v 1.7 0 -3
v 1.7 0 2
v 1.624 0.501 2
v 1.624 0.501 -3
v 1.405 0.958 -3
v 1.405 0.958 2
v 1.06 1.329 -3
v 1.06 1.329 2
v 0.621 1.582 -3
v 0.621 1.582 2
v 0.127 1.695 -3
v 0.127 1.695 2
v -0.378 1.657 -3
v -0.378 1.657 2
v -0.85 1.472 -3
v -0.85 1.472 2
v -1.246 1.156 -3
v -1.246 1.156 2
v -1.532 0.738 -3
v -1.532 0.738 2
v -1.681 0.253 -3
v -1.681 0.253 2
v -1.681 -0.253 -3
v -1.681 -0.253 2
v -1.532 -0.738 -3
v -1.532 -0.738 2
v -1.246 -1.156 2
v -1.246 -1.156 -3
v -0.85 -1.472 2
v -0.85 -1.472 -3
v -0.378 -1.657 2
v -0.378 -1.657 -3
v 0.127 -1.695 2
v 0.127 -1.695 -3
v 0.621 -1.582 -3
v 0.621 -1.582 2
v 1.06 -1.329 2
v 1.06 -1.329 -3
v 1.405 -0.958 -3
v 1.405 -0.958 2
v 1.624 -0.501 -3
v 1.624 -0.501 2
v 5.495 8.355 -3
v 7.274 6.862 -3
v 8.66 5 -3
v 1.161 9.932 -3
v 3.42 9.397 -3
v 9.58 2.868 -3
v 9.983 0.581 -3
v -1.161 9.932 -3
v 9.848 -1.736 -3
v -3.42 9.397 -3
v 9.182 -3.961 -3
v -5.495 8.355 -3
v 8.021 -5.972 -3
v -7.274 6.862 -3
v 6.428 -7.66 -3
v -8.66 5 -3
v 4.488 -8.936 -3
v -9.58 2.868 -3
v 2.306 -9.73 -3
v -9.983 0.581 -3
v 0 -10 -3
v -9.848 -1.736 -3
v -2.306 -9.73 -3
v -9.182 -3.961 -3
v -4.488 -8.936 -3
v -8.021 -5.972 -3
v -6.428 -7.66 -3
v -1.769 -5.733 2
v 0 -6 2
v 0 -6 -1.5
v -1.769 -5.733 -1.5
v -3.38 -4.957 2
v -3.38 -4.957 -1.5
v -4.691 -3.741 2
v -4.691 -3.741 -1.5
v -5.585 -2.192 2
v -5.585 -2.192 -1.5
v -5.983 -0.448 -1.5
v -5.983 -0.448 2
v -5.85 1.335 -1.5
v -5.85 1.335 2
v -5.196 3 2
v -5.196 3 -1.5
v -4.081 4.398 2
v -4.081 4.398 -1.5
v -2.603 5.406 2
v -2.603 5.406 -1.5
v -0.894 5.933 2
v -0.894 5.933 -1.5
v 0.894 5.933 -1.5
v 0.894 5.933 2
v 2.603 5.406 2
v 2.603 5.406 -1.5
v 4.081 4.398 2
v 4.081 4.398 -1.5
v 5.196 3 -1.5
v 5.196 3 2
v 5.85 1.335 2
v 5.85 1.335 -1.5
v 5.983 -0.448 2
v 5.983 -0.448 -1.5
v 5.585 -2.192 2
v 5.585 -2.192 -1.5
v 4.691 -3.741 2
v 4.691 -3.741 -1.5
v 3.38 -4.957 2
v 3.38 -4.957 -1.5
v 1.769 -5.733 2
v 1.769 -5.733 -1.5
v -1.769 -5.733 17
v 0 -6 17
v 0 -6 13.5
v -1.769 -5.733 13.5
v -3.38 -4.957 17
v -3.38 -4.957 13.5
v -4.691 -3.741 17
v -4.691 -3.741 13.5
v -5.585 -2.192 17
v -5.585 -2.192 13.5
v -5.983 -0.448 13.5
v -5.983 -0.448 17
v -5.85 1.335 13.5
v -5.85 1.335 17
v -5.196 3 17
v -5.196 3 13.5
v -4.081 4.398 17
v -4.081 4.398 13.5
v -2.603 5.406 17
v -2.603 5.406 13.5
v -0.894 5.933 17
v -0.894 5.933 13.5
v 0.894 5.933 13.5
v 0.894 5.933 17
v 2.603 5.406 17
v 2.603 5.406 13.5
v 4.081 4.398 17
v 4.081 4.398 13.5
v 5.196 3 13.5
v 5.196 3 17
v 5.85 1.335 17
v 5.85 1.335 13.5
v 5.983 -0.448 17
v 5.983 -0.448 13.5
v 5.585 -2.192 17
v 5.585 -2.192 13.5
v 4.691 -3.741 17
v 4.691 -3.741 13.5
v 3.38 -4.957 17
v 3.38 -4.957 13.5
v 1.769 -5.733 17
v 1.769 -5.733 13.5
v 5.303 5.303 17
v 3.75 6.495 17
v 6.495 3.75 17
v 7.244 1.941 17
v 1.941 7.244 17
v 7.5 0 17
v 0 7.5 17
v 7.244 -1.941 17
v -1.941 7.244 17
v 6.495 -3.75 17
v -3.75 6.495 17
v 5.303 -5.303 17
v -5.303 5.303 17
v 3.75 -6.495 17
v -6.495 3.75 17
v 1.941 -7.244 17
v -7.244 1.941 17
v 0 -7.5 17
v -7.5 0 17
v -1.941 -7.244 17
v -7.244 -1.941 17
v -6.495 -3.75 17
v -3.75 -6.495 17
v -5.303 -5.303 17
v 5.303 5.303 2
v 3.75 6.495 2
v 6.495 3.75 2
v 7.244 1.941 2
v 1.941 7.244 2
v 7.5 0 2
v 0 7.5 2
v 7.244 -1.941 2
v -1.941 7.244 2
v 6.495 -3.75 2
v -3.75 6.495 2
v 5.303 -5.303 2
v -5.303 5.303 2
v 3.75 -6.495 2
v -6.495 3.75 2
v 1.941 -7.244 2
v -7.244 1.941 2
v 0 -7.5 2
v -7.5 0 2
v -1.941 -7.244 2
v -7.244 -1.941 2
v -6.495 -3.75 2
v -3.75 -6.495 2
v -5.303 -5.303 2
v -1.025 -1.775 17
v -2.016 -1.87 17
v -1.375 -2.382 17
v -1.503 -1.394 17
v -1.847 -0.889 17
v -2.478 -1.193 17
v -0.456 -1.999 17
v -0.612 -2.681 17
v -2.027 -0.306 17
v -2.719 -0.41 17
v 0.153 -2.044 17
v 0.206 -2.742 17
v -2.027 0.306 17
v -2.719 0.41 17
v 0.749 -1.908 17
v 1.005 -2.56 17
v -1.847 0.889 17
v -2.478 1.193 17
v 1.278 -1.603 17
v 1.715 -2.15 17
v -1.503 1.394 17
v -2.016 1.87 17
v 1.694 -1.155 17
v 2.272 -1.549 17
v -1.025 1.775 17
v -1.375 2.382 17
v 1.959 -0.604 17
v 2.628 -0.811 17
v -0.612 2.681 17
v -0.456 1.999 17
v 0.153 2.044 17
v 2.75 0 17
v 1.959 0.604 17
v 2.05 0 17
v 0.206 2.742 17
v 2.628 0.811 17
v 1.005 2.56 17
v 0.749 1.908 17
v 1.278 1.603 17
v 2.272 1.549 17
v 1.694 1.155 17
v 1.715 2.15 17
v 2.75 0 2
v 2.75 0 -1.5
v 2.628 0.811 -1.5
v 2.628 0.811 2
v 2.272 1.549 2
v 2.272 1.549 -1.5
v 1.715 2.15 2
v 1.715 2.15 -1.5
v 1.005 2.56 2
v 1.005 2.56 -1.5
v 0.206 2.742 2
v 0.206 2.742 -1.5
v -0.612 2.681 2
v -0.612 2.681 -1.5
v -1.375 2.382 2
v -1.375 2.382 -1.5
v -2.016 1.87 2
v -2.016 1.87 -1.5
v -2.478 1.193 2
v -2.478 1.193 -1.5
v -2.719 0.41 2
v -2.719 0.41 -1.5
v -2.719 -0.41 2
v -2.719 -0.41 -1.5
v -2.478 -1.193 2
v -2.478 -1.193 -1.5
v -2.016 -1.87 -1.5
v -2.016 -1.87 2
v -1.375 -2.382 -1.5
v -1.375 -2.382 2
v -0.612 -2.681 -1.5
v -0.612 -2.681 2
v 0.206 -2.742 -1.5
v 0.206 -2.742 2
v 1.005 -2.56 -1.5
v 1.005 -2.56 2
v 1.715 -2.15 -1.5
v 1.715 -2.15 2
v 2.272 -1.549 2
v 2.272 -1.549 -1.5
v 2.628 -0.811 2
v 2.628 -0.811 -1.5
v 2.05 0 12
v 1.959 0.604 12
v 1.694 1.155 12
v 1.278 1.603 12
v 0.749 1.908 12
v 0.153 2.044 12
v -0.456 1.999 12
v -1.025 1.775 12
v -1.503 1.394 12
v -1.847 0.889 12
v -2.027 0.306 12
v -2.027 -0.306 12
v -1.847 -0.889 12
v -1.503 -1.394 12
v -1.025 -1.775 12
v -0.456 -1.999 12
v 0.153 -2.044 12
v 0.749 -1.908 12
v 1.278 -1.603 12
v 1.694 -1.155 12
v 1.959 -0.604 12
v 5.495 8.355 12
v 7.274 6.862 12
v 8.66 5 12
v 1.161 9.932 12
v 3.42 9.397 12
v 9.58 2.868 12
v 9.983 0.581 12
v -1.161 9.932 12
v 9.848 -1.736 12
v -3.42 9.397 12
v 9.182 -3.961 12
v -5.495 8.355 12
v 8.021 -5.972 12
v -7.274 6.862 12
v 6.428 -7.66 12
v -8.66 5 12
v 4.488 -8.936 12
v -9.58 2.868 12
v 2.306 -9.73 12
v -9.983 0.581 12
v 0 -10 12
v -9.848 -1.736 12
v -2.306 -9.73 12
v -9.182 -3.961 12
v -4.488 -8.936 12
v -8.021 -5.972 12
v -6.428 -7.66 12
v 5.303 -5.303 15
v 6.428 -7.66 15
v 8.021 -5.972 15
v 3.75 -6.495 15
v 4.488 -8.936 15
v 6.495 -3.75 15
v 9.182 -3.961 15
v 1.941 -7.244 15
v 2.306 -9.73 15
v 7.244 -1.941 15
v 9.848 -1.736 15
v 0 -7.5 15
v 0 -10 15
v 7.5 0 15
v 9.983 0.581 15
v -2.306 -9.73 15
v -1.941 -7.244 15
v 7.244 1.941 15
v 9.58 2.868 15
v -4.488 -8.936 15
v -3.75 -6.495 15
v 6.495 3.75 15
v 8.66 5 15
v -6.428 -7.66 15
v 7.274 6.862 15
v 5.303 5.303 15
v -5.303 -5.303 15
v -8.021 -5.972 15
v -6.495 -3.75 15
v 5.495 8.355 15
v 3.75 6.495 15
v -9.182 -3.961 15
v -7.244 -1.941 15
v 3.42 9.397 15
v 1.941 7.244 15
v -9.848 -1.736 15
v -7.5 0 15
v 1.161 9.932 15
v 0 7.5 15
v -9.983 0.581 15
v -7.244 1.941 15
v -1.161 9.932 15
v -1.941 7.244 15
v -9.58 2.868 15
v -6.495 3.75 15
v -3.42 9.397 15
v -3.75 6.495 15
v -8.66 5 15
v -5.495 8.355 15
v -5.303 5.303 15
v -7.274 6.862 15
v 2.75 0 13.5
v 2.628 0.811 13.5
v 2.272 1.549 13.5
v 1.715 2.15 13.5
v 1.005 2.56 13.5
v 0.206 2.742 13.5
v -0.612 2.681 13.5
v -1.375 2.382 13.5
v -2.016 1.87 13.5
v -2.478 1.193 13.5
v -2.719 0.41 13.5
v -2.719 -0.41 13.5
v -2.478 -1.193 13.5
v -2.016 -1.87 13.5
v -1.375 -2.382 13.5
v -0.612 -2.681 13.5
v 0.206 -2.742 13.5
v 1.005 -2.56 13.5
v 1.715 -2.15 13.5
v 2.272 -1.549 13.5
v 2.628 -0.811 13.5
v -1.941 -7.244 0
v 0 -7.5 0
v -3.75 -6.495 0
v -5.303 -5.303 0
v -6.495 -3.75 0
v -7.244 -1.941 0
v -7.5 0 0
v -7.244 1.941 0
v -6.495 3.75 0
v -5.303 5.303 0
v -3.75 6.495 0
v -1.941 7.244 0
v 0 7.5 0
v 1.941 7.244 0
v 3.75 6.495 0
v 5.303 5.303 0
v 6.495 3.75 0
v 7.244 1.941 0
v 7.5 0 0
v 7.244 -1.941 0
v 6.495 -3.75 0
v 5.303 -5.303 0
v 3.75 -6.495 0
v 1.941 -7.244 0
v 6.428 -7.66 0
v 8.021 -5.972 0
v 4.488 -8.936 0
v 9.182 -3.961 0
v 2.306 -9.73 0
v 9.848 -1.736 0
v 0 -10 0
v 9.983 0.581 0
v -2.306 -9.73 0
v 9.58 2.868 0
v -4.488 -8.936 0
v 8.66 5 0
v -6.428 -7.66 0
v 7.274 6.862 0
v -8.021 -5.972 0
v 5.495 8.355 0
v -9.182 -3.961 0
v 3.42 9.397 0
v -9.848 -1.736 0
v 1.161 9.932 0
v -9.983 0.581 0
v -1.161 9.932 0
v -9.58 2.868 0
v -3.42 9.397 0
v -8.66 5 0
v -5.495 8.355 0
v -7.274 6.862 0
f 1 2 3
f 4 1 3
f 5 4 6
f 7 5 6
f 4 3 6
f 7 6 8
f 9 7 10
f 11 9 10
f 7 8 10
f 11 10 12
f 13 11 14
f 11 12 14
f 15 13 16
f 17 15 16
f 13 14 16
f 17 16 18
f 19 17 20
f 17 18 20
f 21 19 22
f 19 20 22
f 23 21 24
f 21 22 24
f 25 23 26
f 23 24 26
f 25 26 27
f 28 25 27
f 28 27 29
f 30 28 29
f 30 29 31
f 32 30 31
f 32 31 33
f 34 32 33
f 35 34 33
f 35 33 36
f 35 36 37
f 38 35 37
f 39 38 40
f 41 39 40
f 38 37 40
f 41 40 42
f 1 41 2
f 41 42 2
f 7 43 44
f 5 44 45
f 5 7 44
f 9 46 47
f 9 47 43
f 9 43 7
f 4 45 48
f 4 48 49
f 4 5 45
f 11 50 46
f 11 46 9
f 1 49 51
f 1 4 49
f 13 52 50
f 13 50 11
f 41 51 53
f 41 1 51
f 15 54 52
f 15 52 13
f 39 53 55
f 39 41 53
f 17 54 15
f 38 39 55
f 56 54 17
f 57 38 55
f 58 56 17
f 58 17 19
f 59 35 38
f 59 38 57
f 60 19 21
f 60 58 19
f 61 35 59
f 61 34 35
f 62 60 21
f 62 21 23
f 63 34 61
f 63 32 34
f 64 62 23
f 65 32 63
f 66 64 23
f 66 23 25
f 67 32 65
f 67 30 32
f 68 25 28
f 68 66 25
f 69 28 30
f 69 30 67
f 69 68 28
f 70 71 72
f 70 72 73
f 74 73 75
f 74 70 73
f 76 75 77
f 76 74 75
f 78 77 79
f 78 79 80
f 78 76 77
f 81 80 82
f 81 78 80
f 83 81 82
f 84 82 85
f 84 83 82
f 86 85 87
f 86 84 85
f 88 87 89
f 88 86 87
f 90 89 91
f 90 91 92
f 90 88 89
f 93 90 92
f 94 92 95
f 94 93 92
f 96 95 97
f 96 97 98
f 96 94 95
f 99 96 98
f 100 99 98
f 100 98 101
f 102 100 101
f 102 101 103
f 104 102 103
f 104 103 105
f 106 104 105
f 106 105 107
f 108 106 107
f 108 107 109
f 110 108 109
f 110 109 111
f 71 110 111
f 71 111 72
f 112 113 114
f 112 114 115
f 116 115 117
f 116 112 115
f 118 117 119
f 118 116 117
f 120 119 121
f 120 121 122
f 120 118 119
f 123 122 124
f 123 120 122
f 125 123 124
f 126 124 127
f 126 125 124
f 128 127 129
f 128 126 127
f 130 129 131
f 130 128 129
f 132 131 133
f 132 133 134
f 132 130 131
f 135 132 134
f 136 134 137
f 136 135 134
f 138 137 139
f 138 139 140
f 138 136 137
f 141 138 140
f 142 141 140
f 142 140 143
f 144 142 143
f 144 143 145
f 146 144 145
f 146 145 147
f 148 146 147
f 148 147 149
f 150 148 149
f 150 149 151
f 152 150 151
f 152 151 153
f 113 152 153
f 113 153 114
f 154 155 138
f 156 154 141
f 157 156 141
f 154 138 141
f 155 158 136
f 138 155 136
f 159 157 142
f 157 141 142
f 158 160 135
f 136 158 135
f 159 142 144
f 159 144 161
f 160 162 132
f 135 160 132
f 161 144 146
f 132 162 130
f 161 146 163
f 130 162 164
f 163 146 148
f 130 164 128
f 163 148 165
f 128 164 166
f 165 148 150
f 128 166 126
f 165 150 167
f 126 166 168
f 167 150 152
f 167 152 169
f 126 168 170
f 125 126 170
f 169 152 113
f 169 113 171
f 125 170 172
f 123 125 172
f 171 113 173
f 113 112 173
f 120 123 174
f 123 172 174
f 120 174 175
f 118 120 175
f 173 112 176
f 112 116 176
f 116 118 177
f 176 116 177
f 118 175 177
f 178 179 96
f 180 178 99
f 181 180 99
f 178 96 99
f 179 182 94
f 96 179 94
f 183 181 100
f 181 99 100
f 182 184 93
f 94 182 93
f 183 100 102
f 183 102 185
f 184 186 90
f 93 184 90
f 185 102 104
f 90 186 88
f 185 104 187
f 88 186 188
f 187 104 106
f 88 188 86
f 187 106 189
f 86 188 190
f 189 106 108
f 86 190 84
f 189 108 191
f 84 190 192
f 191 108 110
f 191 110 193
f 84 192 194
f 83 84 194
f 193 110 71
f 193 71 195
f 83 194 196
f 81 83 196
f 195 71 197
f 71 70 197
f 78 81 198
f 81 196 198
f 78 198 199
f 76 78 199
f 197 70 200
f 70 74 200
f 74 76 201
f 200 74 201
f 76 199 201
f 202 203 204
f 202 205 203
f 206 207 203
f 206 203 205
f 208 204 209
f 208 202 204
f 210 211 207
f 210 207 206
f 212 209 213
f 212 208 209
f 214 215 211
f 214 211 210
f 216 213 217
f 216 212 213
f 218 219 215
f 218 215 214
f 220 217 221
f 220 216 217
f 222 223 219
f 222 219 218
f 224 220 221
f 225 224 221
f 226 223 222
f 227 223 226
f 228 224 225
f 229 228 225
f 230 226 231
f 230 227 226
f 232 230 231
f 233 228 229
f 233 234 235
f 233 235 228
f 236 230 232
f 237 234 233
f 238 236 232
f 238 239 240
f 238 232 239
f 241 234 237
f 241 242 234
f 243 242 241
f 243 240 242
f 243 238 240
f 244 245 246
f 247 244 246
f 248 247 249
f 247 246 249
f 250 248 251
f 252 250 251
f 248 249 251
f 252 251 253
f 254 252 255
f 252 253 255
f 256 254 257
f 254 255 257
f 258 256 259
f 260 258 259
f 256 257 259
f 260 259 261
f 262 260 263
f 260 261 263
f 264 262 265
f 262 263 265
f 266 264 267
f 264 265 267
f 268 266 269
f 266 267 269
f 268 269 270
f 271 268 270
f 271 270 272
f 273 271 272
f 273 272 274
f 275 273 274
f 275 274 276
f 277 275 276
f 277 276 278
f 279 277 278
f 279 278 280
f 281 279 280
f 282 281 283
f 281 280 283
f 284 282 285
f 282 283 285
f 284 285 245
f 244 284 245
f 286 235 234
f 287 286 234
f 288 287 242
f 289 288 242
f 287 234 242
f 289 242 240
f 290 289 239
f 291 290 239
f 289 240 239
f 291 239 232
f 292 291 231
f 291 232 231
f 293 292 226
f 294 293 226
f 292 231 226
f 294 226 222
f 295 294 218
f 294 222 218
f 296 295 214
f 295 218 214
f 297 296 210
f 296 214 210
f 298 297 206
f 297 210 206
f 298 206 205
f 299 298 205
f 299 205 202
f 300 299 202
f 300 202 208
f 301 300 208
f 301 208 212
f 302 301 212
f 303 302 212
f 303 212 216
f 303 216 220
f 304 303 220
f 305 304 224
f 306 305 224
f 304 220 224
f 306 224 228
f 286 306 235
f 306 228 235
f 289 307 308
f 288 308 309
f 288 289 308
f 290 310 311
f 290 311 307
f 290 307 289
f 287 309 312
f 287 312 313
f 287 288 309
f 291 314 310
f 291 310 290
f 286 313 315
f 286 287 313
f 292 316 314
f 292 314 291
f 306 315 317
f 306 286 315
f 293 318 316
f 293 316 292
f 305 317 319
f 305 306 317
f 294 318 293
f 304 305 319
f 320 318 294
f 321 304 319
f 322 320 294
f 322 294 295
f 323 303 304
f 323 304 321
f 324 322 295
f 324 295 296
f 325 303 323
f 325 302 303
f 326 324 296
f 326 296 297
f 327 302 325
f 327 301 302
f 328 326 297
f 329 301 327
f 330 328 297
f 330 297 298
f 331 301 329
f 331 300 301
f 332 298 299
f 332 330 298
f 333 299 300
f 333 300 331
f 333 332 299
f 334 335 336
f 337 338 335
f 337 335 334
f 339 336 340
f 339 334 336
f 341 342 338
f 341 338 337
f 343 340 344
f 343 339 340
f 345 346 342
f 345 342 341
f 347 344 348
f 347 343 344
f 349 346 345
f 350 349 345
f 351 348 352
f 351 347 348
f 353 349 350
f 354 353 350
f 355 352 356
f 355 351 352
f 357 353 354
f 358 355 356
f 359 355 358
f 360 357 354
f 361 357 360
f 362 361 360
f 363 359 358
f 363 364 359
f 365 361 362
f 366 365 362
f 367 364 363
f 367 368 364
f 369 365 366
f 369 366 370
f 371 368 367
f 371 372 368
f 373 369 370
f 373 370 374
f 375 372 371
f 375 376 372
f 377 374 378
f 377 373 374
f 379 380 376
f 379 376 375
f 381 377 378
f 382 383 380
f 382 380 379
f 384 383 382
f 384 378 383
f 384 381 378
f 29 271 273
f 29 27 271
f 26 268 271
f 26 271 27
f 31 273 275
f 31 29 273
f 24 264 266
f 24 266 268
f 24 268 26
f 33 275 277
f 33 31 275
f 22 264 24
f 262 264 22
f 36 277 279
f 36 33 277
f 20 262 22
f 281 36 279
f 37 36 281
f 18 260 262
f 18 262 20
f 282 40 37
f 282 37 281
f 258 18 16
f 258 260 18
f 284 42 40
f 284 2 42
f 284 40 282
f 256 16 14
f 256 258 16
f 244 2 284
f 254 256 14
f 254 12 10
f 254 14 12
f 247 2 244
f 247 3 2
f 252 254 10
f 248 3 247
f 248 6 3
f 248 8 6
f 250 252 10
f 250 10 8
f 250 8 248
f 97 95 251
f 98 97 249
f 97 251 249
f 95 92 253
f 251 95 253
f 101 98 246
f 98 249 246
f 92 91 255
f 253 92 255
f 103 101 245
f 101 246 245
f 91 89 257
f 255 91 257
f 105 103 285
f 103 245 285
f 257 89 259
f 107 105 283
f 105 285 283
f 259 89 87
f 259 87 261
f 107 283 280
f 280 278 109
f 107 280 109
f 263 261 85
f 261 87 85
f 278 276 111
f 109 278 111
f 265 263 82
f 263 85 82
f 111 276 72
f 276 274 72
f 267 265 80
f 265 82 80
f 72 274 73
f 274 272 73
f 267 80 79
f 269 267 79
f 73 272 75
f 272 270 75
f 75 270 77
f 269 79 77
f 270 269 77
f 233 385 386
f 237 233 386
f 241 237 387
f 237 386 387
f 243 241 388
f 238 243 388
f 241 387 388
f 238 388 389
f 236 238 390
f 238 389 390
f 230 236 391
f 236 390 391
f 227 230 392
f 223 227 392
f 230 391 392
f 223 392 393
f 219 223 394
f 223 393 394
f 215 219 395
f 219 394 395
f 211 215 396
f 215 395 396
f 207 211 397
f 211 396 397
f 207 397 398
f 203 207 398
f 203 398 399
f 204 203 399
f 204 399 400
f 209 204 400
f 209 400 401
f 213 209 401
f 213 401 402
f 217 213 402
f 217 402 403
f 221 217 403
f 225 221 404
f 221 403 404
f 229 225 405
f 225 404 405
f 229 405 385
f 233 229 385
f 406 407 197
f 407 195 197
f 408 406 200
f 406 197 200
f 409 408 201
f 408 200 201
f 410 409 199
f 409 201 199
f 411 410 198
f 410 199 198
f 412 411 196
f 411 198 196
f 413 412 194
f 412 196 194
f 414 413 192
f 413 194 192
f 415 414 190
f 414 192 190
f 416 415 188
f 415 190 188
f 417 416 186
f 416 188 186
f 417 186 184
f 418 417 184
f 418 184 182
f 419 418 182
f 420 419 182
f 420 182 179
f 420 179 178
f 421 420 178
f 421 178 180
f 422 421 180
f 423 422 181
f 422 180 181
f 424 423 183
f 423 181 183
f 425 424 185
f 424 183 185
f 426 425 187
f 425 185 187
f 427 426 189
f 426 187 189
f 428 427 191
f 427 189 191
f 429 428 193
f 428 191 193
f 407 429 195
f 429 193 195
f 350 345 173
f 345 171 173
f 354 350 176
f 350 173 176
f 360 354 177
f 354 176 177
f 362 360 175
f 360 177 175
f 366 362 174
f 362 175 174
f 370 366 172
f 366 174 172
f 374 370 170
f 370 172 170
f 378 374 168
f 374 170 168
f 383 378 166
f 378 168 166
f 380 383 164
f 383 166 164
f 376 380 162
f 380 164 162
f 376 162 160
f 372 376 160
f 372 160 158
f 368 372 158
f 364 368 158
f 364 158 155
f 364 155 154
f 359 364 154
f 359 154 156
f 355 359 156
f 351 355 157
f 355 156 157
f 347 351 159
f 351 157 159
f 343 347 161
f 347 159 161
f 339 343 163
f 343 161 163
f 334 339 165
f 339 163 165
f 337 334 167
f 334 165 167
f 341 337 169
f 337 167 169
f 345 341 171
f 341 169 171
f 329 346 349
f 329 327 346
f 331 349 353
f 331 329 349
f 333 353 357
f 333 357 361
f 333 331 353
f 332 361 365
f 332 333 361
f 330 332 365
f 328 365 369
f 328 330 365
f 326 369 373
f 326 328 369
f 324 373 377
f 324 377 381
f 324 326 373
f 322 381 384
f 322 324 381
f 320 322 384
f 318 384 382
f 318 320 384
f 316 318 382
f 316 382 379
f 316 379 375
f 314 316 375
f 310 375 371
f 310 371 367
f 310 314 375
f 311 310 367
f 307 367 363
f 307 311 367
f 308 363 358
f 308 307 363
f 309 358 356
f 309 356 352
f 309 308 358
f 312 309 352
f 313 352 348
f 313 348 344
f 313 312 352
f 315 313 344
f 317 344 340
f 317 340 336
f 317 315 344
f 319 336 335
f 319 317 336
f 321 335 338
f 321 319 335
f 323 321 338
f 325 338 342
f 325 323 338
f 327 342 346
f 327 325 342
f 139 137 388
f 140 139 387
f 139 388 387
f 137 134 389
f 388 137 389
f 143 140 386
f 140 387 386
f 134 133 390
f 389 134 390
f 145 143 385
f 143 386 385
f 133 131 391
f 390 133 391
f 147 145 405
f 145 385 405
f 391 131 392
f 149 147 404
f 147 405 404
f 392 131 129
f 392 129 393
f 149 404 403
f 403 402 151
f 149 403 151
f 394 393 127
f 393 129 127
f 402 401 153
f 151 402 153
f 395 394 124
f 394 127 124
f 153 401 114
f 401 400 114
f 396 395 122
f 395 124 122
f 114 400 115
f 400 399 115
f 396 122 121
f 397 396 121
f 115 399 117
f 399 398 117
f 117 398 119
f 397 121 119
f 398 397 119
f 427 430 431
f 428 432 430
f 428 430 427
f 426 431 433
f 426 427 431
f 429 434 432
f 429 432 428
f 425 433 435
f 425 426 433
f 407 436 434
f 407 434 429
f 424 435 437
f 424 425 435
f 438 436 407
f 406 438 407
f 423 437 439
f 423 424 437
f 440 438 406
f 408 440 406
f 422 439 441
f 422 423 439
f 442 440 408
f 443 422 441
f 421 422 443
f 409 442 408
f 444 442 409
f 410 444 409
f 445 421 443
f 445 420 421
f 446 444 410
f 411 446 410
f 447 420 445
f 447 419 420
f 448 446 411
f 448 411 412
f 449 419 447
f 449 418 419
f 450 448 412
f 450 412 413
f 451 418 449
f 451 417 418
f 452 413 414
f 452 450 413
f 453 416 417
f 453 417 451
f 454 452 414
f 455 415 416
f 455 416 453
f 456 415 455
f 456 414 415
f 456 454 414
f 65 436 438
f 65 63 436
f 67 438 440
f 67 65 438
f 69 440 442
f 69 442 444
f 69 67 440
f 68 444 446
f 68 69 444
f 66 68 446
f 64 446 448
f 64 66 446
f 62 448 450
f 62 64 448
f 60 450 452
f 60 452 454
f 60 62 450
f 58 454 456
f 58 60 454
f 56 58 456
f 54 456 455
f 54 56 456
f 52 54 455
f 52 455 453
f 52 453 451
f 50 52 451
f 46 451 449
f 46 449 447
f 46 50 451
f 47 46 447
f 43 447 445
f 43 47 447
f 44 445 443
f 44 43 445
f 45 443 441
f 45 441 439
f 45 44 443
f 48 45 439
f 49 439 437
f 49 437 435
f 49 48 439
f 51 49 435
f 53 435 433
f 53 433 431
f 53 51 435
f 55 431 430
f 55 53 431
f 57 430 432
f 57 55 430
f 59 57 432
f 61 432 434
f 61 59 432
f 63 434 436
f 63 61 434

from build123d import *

# Parameters (mm, degrees)
F0_W     = 7.5
F0_H     = 2
F2_T     = 1.5
F3_R     = 2.75
F4_DEPTH = 3.5
F5_R     = 1.7
F8_DEPTH = 5
F7_R     = 2.05
F9_DEPTH = 5


# Not quite as in the source:
# - a shell that OpenCascade refuses in one call is made with other operations: the cavity is built on its own and cut out


with BuildPart() as f1:
    # F0 (on Right) → F1 (revolve)
    with BuildSketch(Plane.YZ):
        with Locations((-3.75, 1)):
            Rectangle(F0_W, F0_H)
        Polygon((0, 0), (-7.5, 0), (-10, 0), (-10, -3), (0, -3), align=None)
    revolve(axis=Axis((0, 0, 1), (0, 0, -1)))

    # F2: shell of thickness 1.5, made by hand


with BuildPart() as f2_core1:
    # F2_t2: copy of F1
    add(f1.part)

    # the walls: a layer under each face that stays
    f2_faces = [f2_core1.faces().sort_by_distance(p)[0] for p in [
        (0, 7.5, 1),
        (6.6666666667, -6.6666666667, 0),
        (0, 10, -1.5),
        (0, 0, -3),
    ]]
    thicken(f2_faces, amount=-F2_T, mode=Mode.SUBTRACT)

    # F2_s3 → F2_t4 (revolve, cut)
    with BuildSketch(Plane.YZ):
        Polygon((-7.515, 0.015), (-6, 0), (-6, -1.5), (-7.5, -1.5), align=None)
    revolve(axis=Axis((0, 0, 0), (0, 0, -1)), mode=Mode.SUBTRACT)


with BuildPart() as f1_1:
    add(f1.part)

    # what is left inside the walls is the cavity
    f2_cavity = [f2_core1.part.solids().sort_by_distance(p)[0] for p in [
        (0, 5.985, 0.833333),
    ]]
    add(f2_cavity, mode=Mode.SUBTRACT)

    # F3 (on face) → F4 (join, through all)
    with BuildSketch(Plane.XY.offset(-1.5)):
        Circle(F3_R)
    extrude(amount=F4_DEPTH)


with BuildPart() as f6_1:
    # F6: copy of F1
    add(f1_1.part.moved(Location((0, 0, 15))))

    # F7 (on face) → F9 (cut, through all)
    with BuildSketch(Plane.XY.offset(17)):
        Circle(F7_R)
    extrude(amount=-F9_DEPTH, mode=Mode.SUBTRACT)


with BuildPart() as f1_2:
    add(f1_1.part)

    # F5 (on face) → F8 (cut, through all)
    with BuildSketch(Plane.XY.offset(2)):
        Circle(F5_R)
    extrude(amount=-F8_DEPTH, mode=Mode.SUBTRACT)


solid = Compound([f6_1.part, f1_2.part])
